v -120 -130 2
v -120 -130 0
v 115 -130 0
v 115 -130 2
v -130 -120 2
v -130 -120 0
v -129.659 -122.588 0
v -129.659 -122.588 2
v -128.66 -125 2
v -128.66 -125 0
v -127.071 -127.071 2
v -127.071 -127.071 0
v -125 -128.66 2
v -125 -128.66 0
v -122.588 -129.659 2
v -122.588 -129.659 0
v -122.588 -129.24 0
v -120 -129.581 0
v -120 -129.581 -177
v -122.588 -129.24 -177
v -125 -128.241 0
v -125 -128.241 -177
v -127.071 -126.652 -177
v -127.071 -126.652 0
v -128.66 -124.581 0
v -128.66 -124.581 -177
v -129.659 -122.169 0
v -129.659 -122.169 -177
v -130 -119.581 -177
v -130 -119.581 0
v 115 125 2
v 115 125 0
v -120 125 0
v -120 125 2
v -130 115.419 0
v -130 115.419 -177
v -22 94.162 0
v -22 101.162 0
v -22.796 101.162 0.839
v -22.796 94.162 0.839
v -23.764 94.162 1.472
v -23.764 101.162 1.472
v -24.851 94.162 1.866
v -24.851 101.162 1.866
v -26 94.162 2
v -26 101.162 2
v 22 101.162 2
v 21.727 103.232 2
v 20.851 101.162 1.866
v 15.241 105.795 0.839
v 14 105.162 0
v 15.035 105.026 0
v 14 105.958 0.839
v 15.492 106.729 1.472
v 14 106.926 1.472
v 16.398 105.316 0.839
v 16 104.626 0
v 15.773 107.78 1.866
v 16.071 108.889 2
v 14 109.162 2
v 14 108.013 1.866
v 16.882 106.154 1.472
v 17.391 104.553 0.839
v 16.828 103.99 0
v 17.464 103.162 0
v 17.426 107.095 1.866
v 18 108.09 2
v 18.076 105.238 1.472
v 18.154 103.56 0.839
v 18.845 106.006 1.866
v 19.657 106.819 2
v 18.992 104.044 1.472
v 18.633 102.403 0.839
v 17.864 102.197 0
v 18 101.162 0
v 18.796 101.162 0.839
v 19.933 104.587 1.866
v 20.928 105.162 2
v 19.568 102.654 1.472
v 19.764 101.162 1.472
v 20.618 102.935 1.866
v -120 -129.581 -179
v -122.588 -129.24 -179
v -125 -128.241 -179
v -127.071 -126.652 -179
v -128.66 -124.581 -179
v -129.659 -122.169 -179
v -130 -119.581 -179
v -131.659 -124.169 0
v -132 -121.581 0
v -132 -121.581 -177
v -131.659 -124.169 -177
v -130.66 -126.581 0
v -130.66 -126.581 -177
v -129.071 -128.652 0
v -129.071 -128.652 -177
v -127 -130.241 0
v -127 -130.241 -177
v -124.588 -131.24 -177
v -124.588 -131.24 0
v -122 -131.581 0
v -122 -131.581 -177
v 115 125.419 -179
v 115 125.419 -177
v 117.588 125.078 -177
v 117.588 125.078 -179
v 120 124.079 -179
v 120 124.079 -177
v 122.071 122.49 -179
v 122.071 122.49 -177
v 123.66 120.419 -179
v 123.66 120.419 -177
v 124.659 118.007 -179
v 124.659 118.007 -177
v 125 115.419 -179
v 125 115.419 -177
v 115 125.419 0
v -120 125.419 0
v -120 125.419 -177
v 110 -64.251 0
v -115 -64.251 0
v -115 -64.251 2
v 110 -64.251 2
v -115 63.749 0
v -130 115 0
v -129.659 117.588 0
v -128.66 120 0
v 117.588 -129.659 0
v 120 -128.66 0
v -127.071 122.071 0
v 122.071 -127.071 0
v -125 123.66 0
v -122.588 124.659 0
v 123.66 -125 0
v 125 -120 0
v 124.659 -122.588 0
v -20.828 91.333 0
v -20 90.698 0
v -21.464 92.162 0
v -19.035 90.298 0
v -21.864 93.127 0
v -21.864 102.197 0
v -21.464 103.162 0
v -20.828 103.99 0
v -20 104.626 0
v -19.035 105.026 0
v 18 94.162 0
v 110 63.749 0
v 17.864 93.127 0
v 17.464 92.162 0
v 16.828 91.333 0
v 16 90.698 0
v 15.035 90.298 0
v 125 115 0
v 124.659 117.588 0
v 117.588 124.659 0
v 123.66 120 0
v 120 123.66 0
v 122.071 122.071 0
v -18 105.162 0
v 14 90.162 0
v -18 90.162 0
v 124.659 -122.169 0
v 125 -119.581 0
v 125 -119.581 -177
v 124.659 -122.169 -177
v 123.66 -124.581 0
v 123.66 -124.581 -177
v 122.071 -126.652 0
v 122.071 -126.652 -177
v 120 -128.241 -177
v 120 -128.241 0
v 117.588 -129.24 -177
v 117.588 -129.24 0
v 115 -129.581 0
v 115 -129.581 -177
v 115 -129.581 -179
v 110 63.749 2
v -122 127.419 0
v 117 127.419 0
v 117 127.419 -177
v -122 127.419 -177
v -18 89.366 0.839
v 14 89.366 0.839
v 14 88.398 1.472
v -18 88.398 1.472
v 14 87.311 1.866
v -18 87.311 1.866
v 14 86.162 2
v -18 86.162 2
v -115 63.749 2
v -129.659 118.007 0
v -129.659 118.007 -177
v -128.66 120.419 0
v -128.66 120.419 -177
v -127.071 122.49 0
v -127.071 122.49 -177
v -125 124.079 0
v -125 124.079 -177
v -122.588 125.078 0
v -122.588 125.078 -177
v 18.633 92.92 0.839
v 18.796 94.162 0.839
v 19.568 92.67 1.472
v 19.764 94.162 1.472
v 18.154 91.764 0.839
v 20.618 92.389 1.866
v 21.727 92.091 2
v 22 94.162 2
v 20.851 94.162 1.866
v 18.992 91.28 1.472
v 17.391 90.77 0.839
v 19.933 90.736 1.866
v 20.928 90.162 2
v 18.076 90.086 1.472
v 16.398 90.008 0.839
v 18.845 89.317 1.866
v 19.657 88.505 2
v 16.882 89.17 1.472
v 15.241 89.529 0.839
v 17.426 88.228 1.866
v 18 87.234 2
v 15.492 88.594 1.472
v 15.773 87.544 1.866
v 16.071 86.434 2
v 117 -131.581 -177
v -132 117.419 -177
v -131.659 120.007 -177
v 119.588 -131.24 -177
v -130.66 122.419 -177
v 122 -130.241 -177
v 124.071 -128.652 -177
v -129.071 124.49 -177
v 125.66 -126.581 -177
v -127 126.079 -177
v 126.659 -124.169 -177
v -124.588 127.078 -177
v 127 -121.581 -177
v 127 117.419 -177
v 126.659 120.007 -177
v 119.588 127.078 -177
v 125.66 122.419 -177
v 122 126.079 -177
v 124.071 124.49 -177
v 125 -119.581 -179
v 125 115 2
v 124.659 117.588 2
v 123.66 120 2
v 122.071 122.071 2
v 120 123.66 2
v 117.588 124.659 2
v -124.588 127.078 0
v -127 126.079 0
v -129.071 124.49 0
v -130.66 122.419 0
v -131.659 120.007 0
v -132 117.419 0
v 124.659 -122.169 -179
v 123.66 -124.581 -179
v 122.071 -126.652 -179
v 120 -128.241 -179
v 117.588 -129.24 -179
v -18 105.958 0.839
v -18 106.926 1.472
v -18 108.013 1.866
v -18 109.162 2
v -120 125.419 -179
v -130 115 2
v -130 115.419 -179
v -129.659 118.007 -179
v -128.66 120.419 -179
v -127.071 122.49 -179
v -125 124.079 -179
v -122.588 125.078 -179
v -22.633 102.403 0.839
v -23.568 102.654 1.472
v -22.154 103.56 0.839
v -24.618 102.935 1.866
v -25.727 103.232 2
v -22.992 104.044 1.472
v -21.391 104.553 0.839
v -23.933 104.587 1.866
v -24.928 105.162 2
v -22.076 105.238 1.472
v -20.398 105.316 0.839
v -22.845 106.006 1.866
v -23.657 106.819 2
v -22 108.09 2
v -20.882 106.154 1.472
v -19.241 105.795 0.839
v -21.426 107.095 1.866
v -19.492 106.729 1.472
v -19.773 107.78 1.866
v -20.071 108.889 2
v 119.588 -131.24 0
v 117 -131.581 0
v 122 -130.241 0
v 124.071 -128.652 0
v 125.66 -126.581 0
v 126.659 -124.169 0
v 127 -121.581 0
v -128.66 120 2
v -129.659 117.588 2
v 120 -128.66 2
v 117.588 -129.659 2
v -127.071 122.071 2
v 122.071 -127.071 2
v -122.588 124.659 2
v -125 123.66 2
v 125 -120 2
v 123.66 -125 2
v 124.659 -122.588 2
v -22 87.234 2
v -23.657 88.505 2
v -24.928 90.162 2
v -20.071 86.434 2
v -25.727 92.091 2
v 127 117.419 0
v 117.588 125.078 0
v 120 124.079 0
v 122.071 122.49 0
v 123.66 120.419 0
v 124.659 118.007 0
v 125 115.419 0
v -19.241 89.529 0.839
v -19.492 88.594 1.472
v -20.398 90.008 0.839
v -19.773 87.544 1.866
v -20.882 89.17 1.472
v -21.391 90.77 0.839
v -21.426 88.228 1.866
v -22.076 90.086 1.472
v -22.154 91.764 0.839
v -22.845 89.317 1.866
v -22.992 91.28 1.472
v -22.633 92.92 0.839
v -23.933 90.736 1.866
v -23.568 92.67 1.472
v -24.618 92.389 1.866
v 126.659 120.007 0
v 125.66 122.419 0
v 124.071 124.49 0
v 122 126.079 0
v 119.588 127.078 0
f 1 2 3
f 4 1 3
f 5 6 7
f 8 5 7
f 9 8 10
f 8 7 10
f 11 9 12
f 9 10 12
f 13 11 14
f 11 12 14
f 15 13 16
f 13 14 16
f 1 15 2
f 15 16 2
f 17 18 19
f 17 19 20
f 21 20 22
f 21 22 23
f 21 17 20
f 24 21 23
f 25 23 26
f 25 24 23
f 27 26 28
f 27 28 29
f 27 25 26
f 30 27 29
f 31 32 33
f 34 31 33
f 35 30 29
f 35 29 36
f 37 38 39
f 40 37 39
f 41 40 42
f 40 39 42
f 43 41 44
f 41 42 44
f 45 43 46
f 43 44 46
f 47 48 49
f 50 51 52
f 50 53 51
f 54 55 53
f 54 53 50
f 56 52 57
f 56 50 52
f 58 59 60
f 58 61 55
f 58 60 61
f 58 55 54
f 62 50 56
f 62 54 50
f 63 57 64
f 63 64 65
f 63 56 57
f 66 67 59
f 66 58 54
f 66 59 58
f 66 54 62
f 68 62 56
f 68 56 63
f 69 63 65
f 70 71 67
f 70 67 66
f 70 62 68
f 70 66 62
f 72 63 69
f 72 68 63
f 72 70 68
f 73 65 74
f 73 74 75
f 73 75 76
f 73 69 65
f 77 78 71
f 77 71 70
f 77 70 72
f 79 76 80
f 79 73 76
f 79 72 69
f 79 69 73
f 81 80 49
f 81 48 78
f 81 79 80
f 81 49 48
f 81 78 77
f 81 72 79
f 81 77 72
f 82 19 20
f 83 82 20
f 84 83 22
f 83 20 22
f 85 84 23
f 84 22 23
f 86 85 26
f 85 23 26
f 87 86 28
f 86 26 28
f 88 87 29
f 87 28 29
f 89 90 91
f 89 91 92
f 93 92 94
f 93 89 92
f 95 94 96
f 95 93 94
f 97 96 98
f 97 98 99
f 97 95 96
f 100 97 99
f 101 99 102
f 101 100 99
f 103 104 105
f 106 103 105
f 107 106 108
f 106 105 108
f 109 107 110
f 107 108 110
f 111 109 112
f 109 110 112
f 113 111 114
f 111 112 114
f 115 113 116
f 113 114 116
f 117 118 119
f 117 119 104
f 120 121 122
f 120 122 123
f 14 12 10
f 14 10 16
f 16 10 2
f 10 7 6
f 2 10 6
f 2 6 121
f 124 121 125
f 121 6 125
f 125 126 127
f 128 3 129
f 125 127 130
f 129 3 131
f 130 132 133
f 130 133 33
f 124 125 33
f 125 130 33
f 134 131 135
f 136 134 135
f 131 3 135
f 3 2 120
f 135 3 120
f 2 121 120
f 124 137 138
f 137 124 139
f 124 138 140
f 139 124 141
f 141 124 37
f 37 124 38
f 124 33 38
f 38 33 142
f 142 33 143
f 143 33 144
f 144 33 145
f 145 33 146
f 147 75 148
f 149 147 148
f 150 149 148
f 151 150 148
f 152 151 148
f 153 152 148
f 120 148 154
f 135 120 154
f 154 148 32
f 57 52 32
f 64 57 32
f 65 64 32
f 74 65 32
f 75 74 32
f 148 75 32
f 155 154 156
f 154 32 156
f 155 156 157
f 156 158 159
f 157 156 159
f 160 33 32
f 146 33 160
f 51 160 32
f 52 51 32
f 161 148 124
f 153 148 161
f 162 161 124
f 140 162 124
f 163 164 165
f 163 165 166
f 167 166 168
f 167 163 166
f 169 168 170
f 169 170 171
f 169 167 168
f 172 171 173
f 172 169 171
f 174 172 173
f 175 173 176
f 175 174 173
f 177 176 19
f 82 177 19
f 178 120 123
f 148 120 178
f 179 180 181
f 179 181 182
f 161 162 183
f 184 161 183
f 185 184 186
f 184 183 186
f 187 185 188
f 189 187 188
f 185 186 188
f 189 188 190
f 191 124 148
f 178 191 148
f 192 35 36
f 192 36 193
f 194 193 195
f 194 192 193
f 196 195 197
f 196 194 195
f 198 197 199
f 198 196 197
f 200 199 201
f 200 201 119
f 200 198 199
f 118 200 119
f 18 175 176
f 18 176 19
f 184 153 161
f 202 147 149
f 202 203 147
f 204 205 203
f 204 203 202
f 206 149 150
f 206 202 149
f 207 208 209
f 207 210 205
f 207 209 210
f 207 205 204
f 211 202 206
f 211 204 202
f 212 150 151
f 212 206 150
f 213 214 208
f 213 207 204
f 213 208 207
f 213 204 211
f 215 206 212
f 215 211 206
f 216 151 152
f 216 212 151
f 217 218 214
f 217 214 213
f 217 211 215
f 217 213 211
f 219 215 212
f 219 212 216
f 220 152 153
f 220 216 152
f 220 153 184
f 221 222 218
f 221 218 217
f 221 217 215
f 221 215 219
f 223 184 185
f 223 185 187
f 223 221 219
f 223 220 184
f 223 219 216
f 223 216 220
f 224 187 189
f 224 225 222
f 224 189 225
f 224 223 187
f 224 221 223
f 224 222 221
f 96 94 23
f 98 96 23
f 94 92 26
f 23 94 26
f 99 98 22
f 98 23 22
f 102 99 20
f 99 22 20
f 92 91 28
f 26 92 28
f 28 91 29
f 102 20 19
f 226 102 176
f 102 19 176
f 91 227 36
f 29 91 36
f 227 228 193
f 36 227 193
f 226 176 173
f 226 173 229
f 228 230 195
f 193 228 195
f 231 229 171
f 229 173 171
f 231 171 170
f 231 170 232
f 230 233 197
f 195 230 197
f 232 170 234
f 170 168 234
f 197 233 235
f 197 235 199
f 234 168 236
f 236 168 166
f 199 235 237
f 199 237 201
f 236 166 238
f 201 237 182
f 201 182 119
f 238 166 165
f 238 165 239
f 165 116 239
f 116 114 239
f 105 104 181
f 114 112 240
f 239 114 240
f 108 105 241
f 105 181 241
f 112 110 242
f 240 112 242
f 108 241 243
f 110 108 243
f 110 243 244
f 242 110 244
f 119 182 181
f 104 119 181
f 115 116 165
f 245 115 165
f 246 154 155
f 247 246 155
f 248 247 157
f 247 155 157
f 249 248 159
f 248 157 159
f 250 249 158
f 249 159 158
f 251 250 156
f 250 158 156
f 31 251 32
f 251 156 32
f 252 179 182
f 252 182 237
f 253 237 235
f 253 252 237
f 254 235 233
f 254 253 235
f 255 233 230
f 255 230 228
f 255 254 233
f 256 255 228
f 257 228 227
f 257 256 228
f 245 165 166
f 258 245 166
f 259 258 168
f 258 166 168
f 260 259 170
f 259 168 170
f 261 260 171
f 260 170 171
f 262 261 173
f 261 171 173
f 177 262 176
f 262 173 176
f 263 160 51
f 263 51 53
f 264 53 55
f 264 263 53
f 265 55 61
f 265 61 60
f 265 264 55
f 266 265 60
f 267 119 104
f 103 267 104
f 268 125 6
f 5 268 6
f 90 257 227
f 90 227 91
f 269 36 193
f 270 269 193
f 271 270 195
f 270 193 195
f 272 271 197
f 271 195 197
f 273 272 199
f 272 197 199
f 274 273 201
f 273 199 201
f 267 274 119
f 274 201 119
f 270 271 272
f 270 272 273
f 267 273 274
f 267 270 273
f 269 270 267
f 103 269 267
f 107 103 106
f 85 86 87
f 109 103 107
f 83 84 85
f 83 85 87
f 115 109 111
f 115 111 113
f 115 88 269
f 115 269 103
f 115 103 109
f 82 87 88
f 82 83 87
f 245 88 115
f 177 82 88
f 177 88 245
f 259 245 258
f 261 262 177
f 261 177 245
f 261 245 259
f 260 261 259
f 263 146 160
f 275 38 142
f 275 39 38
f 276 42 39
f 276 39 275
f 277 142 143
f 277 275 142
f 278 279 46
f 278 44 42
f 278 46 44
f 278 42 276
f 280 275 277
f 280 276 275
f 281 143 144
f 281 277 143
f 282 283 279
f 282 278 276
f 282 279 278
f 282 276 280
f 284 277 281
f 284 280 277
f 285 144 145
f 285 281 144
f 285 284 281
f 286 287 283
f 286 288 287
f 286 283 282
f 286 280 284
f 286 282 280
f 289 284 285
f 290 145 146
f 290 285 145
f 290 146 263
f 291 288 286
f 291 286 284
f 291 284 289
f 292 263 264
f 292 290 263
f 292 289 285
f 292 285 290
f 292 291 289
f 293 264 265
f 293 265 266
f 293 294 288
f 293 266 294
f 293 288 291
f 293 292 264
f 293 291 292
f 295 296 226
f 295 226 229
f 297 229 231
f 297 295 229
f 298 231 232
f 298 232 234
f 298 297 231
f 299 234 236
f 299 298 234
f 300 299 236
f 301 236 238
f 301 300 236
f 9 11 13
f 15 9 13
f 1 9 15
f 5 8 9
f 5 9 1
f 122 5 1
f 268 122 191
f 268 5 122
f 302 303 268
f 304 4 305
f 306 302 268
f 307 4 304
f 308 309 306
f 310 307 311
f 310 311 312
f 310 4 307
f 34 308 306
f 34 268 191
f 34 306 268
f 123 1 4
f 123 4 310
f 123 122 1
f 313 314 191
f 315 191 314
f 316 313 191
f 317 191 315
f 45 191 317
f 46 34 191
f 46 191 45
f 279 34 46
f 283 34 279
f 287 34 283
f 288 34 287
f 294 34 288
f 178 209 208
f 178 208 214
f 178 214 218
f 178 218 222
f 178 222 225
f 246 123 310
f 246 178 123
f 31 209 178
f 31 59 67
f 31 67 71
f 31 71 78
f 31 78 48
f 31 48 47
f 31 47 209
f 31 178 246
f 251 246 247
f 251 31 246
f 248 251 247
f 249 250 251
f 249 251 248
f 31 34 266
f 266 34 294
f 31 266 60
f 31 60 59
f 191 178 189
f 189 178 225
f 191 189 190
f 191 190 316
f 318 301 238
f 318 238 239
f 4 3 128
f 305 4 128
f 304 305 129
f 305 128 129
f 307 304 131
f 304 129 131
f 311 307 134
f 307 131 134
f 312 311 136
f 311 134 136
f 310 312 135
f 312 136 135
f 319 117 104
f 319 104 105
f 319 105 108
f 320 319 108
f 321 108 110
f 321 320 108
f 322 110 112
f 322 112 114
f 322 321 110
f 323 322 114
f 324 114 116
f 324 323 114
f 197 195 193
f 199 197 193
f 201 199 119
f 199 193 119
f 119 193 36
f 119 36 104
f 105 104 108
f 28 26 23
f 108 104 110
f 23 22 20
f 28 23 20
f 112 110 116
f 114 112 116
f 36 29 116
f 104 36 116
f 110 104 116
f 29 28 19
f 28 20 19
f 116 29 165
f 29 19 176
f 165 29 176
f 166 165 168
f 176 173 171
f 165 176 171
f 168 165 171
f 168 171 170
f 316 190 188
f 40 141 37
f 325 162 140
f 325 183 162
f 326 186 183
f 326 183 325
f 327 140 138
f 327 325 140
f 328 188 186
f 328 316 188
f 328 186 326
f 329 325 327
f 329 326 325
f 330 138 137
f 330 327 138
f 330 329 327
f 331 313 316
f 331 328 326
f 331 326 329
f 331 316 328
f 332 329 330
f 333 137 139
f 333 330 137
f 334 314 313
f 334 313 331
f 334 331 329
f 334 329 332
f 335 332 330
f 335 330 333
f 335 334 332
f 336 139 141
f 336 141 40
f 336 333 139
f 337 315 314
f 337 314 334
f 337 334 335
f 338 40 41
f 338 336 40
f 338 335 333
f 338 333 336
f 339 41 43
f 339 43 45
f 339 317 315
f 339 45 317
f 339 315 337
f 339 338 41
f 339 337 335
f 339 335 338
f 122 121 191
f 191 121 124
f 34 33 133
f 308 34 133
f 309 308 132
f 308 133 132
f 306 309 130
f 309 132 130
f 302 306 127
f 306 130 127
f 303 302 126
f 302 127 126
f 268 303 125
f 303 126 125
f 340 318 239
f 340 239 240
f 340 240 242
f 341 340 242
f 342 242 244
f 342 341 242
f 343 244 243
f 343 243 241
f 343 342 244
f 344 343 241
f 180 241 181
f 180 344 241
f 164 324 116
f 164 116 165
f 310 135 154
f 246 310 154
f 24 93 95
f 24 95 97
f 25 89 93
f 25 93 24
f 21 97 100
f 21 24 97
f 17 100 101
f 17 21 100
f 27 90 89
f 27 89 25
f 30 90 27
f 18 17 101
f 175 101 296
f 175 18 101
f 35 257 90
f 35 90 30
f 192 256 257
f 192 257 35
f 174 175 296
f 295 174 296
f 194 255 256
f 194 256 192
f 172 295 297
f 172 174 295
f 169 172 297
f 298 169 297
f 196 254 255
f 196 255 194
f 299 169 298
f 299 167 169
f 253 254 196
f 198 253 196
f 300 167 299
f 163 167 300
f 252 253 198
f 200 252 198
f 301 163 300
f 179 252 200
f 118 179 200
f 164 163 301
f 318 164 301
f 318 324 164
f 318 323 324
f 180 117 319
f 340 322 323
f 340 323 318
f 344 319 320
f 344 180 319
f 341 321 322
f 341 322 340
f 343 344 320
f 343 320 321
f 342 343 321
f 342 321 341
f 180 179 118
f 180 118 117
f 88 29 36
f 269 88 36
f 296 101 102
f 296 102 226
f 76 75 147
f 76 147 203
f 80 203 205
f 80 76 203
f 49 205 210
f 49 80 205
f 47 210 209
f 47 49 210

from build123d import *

# Parameters (mm, degrees)
F0_W         = 225
F0_H         = 128
F1_DEPTH     = 2
F2_T1_DEPTH  = 32
F2_T3_DEPTH  = 7
F2_T6_ANGLE  = 90
F2_T8_ANGLE  = 90
F2_T10_ANGLE = 90
F2_T12_ANGLE = 90
F4_DEPTH     = 177
F6_DEPTH     = 2


# Not quite as in the source:
# - a fillet or chamfer that OpenCascade refuses, or shapes differently, is made with other operations: its cross-section is extruded or revolved along the edge and cut away or added


with BuildPart() as f1:
    # F0 (on Top) → F1 (new body)
    with BuildSketch(Plane.XY):
        with BuildLine():
            Line((-120, -130), (115, -130))
            ThreePointArc((115, -130), (122.0710678119, -127.0710678119), (125, -120))
            Line((125, -120), (125, 115))
            ThreePointArc((125, 115), (122.0710678119, 122.0710678119), (115, 125))
            Line((115, 125), (-120, 125))
            ThreePointArc((-120, 125), (-127.0710678119, 122.0710678119), (-130, 115))
            Line((-130, 115), (-130, -120))
            ThreePointArc((-130, -120), (-127.0710678119, -127.0710678119), (-120, -130))
        make_face()
        with Locations((-2.5000095367, -0.2505254149)):
            Rectangle(F0_W, F0_H, mode=Mode.SUBTRACT)
        with BuildLine():
            Line((-18.0000054687, 105.1618295312), (13.9999945313, 105.1618295312))
            ThreePointArc((13.9999945313, 105.1618295312), (16.828421656, 103.9902566559), (17.9999945313, 101.1618295312))
            Line((17.9999945313, 101.1618295312), (17.9999945313, 94.1618295312))
            ThreePointArc((17.9999945313, 94.1618295312), (16.828421656, 91.3334024064), (13.9999945313, 90.1618295312))
            Line((13.9999945313, 90.1618295312), (-18.0000054687, 90.1618295312))
            ThreePointArc((-18.0000054687, 90.1618295312), (-20.8284325935, 91.3334024064), (-22.0000054687, 94.1618295312))
            Line((-22.0000054687, 94.1618295312), (-22.0000054687, 101.1618295312))
            ThreePointArc((-22.0000054687, 101.1618295312), (-20.8284325935, 103.9902566559), (-18.0000054687, 105.1618295312))
        make_face(mode=Mode.SUBTRACT)
    extrude(amount=F1_DEPTH)

    # F2: fillet of radius 5 on 1 edges, made by hand

    # F2_s2 → F2_t1 (cut)
    with BuildSketch(Plane.YZ.offset(-18.0000054687)):
        with BuildLine():
            ThreePointArc((90.1618295312, 0), (88.3978975087, 1.472135955), (86.1618295312, 2))
            Line((86.1618295312, 2), (90.1618295312, 2))
            Line((90.1618295312, 2), (90.1618295312, 0))
        make_face()
        with BuildLine():
            ThreePointArc((105.1618295312, 0), (106.9257615537, 1.472135955), (109.1618295312, 2))
            Line((109.1618295312, 2), (105.1618295312, 2))
            Line((105.1618295312, 2), (105.1618295312, 0))
        make_face()
    extrude(amount=F2_T1_DEPTH, mode=Mode.SUBTRACT)

    # F2_s4 → F2_t3 (cut)
    with BuildSketch(Plane.XZ.offset(-101.1618295312)):
        with BuildLine():
            ThreePointArc((-22.0000054687, 0), (-23.7639374912, 1.472135955), (-26.0000054687, 2))
            Line((-26.0000054687, 2), (-22.0000054687, 2))
            Line((-22.0000054687, 2), (-22.0000054687, 0))
        make_face()
        with BuildLine():
            ThreePointArc((17.9999945313, 0), (19.7639265538, 1.472135955), (21.9999945313, 2))
            Line((21.9999945313, 2), (17.9999945313, 2))
            Line((17.9999945313, 2), (17.9999945313, 0))
        make_face()
    extrude(amount=F2_T3_DEPTH, mode=Mode.SUBTRACT)

    # F2_s5 → F2_t6 (revolve, cut)
    with BuildSketch(Plane.XZ.offset(-94.1618295312)):
        with BuildLine():
            ThreePointArc((17.9999945313, 0), (19.7639265538, 1.472135955), (21.9999945313, 2))
            Line((21.9999945313, 2), (17.9999945313, 2))
            Line((17.9999945313, 2), (17.9999945313, 0))
        make_face()
    revolve(axis=Axis((13.9999945313, 94.1618295312, 2), (0, 0, -1)), revolution_arc=F2_T6_ANGLE, mode=Mode.SUBTRACT)

    # F2_s7 → F2_t8 (revolve, cut)
    with BuildSketch(Plane.YZ.offset(-18.0000054687)):
        with BuildLine():
            ThreePointArc((90.1618295312, 0), (88.3978975087, 1.472135955), (86.1618295312, 2))
            Line((86.1618295312, 2), (90.1618295312, 2))
            Line((90.1618295312, 2), (90.1618295312, 0))
        make_face()
    revolve(axis=Axis((-18.0000054687, 94.1618295312, 2), (0, 0, -1)), revolution_arc=F2_T8_ANGLE, mode=Mode.SUBTRACT)

    # F2_s9 → F2_t10 (revolve, cut)
    with BuildSketch(Plane.XZ.offset(-101.1618295312)):
        with BuildLine():
            ThreePointArc((-22.0000054687, 0), (-23.7639374912, 1.472135955), (-26.0000054687, 2))
            Line((-26.0000054687, 2), (-22.0000054687, 2))
            Line((-22.0000054687, 2), (-22.0000054687, 0))
        make_face()
    revolve(axis=Axis((-18.0000054687, 101.1618295312, 2), (0, 0, -1)), revolution_arc=F2_T10_ANGLE, mode=Mode.SUBTRACT)

    # F2_s11 → F2_t12 (revolve, cut)
    with BuildSketch(Plane.YZ.offset(13.9999945313)):
        with BuildLine():
            ThreePointArc((105.1618295312, 0), (106.9257615537, 1.472135955), (109.1618295312, 2))
            Line((109.1618295312, 2), (105.1618295312, 2))
            Line((105.1618295312, 2), (105.1618295312, 0))
        make_face()
    revolve(axis=Axis((13.9999945313, 101.1618295312, 2), (0, 0, -1)), revolution_arc=F2_T12_ANGLE, mode=Mode.SUBTRACT)


with BuildPart() as f4:
    # F3 (on Top) → F4 (new body)
    with BuildSketch(Plane.XY):
        with BuildLine():
            Line((-121.9999992847, -131.5808296204), (117.0000007153, -131.5808296204))
            ThreePointArc((117.0000007153, -131.5808296204), (124.0710685271, -128.6518974322), (127.0000007153, -121.5808296204))
            Line((127.0000007153, -121.5808296204), (127.0000007153, 117.4191703796))
            ThreePointArc((127.0000007153, 117.4191703796), (124.0710685271, 124.4902381915), (117.0000007153, 127.4191703796))
            Line((117.0000007153, 127.4191703796), (-121.9999992847, 127.4191703796))
            ThreePointArc((-121.9999992847, 127.4191703796), (-129.0710670966, 124.4902381915), (-131.9999992847, 117.4191703796))
            Line((-131.9999992847, 117.4191703796), (-131.9999992847, -121.5808296204))
            ThreePointArc((-131.9999992847, -121.5808296204), (-129.0710670966, -128.6518974322), (-121.9999992847, -131.5808296204))
        make_face()
        with BuildLine():
            ThreePointArc((125.0000007153, -119.5808296204), (122.0710685271, -126.6518974322), (115.0000007153, -129.5808296204))
            Line((115.0000007153, -129.5808296204), (-119.9999992847, -129.5808296204))
            ThreePointArc((-119.9999992847, -129.5808296204), (-127.0710670966, -126.6518974322), (-129.9999992847, -119.5808296204))
            Line((-129.9999992847, -119.5808296204), (-129.9999992847, 115.4191703796))
            ThreePointArc((-129.9999992847, 115.4191703796), (-127.0710670966, 122.4902381915), (-119.9999992847, 125.4191703796))
            Line((-119.9999992847, 125.4191703796), (115.0000007153, 125.4191703796))
            ThreePointArc((115.0000007153, 125.4191703796), (122.0710685271, 122.4902381915), (125.0000007153, 115.4191703796))
            Line((125.0000007153, 115.4191703796), (125.0000007153, -119.5808296204))
        make_face(mode=Mode.SUBTRACT)
    extrude(amount=-F4_DEPTH)


with BuildPart() as f6:
    # F5 (on face) → F6 (new body)
    with BuildSketch(Plane(origin=(0, 0, -177), x_dir=(1, 0, 0), z_dir=(0, 0, -1))):
        with BuildLine():
            Line((-120, -125.4191703796), (115, -125.4191703796))
            ThreePointArc((115, -125.4191703796), (122.0710678119, -122.4902381915), (125, -115.4191703796))
            Line((125, -115.4191703796), (125, 119.5808296204))
            ThreePointArc((125, 119.5808296204), (122.0710678119, 126.6518974322), (115, 129.5808296204))
            Line((115, 129.5808296204), (-120, 129.5808296204))
            ThreePointArc((-120, 129.5808296204), (-127.0710678119, 126.6518974322), (-130, 119.5808296204))
            Line((-130, 119.5808296204), (-130, -115.4191703796))
            ThreePointArc((-130, -115.4191703796), (-127.0710678119, -122.4902381915), (-120, -125.4191703796))
        make_face()
    extrude(amount=F6_DEPTH)


solid = Compound([f1.part, f4.part, f6.part])
